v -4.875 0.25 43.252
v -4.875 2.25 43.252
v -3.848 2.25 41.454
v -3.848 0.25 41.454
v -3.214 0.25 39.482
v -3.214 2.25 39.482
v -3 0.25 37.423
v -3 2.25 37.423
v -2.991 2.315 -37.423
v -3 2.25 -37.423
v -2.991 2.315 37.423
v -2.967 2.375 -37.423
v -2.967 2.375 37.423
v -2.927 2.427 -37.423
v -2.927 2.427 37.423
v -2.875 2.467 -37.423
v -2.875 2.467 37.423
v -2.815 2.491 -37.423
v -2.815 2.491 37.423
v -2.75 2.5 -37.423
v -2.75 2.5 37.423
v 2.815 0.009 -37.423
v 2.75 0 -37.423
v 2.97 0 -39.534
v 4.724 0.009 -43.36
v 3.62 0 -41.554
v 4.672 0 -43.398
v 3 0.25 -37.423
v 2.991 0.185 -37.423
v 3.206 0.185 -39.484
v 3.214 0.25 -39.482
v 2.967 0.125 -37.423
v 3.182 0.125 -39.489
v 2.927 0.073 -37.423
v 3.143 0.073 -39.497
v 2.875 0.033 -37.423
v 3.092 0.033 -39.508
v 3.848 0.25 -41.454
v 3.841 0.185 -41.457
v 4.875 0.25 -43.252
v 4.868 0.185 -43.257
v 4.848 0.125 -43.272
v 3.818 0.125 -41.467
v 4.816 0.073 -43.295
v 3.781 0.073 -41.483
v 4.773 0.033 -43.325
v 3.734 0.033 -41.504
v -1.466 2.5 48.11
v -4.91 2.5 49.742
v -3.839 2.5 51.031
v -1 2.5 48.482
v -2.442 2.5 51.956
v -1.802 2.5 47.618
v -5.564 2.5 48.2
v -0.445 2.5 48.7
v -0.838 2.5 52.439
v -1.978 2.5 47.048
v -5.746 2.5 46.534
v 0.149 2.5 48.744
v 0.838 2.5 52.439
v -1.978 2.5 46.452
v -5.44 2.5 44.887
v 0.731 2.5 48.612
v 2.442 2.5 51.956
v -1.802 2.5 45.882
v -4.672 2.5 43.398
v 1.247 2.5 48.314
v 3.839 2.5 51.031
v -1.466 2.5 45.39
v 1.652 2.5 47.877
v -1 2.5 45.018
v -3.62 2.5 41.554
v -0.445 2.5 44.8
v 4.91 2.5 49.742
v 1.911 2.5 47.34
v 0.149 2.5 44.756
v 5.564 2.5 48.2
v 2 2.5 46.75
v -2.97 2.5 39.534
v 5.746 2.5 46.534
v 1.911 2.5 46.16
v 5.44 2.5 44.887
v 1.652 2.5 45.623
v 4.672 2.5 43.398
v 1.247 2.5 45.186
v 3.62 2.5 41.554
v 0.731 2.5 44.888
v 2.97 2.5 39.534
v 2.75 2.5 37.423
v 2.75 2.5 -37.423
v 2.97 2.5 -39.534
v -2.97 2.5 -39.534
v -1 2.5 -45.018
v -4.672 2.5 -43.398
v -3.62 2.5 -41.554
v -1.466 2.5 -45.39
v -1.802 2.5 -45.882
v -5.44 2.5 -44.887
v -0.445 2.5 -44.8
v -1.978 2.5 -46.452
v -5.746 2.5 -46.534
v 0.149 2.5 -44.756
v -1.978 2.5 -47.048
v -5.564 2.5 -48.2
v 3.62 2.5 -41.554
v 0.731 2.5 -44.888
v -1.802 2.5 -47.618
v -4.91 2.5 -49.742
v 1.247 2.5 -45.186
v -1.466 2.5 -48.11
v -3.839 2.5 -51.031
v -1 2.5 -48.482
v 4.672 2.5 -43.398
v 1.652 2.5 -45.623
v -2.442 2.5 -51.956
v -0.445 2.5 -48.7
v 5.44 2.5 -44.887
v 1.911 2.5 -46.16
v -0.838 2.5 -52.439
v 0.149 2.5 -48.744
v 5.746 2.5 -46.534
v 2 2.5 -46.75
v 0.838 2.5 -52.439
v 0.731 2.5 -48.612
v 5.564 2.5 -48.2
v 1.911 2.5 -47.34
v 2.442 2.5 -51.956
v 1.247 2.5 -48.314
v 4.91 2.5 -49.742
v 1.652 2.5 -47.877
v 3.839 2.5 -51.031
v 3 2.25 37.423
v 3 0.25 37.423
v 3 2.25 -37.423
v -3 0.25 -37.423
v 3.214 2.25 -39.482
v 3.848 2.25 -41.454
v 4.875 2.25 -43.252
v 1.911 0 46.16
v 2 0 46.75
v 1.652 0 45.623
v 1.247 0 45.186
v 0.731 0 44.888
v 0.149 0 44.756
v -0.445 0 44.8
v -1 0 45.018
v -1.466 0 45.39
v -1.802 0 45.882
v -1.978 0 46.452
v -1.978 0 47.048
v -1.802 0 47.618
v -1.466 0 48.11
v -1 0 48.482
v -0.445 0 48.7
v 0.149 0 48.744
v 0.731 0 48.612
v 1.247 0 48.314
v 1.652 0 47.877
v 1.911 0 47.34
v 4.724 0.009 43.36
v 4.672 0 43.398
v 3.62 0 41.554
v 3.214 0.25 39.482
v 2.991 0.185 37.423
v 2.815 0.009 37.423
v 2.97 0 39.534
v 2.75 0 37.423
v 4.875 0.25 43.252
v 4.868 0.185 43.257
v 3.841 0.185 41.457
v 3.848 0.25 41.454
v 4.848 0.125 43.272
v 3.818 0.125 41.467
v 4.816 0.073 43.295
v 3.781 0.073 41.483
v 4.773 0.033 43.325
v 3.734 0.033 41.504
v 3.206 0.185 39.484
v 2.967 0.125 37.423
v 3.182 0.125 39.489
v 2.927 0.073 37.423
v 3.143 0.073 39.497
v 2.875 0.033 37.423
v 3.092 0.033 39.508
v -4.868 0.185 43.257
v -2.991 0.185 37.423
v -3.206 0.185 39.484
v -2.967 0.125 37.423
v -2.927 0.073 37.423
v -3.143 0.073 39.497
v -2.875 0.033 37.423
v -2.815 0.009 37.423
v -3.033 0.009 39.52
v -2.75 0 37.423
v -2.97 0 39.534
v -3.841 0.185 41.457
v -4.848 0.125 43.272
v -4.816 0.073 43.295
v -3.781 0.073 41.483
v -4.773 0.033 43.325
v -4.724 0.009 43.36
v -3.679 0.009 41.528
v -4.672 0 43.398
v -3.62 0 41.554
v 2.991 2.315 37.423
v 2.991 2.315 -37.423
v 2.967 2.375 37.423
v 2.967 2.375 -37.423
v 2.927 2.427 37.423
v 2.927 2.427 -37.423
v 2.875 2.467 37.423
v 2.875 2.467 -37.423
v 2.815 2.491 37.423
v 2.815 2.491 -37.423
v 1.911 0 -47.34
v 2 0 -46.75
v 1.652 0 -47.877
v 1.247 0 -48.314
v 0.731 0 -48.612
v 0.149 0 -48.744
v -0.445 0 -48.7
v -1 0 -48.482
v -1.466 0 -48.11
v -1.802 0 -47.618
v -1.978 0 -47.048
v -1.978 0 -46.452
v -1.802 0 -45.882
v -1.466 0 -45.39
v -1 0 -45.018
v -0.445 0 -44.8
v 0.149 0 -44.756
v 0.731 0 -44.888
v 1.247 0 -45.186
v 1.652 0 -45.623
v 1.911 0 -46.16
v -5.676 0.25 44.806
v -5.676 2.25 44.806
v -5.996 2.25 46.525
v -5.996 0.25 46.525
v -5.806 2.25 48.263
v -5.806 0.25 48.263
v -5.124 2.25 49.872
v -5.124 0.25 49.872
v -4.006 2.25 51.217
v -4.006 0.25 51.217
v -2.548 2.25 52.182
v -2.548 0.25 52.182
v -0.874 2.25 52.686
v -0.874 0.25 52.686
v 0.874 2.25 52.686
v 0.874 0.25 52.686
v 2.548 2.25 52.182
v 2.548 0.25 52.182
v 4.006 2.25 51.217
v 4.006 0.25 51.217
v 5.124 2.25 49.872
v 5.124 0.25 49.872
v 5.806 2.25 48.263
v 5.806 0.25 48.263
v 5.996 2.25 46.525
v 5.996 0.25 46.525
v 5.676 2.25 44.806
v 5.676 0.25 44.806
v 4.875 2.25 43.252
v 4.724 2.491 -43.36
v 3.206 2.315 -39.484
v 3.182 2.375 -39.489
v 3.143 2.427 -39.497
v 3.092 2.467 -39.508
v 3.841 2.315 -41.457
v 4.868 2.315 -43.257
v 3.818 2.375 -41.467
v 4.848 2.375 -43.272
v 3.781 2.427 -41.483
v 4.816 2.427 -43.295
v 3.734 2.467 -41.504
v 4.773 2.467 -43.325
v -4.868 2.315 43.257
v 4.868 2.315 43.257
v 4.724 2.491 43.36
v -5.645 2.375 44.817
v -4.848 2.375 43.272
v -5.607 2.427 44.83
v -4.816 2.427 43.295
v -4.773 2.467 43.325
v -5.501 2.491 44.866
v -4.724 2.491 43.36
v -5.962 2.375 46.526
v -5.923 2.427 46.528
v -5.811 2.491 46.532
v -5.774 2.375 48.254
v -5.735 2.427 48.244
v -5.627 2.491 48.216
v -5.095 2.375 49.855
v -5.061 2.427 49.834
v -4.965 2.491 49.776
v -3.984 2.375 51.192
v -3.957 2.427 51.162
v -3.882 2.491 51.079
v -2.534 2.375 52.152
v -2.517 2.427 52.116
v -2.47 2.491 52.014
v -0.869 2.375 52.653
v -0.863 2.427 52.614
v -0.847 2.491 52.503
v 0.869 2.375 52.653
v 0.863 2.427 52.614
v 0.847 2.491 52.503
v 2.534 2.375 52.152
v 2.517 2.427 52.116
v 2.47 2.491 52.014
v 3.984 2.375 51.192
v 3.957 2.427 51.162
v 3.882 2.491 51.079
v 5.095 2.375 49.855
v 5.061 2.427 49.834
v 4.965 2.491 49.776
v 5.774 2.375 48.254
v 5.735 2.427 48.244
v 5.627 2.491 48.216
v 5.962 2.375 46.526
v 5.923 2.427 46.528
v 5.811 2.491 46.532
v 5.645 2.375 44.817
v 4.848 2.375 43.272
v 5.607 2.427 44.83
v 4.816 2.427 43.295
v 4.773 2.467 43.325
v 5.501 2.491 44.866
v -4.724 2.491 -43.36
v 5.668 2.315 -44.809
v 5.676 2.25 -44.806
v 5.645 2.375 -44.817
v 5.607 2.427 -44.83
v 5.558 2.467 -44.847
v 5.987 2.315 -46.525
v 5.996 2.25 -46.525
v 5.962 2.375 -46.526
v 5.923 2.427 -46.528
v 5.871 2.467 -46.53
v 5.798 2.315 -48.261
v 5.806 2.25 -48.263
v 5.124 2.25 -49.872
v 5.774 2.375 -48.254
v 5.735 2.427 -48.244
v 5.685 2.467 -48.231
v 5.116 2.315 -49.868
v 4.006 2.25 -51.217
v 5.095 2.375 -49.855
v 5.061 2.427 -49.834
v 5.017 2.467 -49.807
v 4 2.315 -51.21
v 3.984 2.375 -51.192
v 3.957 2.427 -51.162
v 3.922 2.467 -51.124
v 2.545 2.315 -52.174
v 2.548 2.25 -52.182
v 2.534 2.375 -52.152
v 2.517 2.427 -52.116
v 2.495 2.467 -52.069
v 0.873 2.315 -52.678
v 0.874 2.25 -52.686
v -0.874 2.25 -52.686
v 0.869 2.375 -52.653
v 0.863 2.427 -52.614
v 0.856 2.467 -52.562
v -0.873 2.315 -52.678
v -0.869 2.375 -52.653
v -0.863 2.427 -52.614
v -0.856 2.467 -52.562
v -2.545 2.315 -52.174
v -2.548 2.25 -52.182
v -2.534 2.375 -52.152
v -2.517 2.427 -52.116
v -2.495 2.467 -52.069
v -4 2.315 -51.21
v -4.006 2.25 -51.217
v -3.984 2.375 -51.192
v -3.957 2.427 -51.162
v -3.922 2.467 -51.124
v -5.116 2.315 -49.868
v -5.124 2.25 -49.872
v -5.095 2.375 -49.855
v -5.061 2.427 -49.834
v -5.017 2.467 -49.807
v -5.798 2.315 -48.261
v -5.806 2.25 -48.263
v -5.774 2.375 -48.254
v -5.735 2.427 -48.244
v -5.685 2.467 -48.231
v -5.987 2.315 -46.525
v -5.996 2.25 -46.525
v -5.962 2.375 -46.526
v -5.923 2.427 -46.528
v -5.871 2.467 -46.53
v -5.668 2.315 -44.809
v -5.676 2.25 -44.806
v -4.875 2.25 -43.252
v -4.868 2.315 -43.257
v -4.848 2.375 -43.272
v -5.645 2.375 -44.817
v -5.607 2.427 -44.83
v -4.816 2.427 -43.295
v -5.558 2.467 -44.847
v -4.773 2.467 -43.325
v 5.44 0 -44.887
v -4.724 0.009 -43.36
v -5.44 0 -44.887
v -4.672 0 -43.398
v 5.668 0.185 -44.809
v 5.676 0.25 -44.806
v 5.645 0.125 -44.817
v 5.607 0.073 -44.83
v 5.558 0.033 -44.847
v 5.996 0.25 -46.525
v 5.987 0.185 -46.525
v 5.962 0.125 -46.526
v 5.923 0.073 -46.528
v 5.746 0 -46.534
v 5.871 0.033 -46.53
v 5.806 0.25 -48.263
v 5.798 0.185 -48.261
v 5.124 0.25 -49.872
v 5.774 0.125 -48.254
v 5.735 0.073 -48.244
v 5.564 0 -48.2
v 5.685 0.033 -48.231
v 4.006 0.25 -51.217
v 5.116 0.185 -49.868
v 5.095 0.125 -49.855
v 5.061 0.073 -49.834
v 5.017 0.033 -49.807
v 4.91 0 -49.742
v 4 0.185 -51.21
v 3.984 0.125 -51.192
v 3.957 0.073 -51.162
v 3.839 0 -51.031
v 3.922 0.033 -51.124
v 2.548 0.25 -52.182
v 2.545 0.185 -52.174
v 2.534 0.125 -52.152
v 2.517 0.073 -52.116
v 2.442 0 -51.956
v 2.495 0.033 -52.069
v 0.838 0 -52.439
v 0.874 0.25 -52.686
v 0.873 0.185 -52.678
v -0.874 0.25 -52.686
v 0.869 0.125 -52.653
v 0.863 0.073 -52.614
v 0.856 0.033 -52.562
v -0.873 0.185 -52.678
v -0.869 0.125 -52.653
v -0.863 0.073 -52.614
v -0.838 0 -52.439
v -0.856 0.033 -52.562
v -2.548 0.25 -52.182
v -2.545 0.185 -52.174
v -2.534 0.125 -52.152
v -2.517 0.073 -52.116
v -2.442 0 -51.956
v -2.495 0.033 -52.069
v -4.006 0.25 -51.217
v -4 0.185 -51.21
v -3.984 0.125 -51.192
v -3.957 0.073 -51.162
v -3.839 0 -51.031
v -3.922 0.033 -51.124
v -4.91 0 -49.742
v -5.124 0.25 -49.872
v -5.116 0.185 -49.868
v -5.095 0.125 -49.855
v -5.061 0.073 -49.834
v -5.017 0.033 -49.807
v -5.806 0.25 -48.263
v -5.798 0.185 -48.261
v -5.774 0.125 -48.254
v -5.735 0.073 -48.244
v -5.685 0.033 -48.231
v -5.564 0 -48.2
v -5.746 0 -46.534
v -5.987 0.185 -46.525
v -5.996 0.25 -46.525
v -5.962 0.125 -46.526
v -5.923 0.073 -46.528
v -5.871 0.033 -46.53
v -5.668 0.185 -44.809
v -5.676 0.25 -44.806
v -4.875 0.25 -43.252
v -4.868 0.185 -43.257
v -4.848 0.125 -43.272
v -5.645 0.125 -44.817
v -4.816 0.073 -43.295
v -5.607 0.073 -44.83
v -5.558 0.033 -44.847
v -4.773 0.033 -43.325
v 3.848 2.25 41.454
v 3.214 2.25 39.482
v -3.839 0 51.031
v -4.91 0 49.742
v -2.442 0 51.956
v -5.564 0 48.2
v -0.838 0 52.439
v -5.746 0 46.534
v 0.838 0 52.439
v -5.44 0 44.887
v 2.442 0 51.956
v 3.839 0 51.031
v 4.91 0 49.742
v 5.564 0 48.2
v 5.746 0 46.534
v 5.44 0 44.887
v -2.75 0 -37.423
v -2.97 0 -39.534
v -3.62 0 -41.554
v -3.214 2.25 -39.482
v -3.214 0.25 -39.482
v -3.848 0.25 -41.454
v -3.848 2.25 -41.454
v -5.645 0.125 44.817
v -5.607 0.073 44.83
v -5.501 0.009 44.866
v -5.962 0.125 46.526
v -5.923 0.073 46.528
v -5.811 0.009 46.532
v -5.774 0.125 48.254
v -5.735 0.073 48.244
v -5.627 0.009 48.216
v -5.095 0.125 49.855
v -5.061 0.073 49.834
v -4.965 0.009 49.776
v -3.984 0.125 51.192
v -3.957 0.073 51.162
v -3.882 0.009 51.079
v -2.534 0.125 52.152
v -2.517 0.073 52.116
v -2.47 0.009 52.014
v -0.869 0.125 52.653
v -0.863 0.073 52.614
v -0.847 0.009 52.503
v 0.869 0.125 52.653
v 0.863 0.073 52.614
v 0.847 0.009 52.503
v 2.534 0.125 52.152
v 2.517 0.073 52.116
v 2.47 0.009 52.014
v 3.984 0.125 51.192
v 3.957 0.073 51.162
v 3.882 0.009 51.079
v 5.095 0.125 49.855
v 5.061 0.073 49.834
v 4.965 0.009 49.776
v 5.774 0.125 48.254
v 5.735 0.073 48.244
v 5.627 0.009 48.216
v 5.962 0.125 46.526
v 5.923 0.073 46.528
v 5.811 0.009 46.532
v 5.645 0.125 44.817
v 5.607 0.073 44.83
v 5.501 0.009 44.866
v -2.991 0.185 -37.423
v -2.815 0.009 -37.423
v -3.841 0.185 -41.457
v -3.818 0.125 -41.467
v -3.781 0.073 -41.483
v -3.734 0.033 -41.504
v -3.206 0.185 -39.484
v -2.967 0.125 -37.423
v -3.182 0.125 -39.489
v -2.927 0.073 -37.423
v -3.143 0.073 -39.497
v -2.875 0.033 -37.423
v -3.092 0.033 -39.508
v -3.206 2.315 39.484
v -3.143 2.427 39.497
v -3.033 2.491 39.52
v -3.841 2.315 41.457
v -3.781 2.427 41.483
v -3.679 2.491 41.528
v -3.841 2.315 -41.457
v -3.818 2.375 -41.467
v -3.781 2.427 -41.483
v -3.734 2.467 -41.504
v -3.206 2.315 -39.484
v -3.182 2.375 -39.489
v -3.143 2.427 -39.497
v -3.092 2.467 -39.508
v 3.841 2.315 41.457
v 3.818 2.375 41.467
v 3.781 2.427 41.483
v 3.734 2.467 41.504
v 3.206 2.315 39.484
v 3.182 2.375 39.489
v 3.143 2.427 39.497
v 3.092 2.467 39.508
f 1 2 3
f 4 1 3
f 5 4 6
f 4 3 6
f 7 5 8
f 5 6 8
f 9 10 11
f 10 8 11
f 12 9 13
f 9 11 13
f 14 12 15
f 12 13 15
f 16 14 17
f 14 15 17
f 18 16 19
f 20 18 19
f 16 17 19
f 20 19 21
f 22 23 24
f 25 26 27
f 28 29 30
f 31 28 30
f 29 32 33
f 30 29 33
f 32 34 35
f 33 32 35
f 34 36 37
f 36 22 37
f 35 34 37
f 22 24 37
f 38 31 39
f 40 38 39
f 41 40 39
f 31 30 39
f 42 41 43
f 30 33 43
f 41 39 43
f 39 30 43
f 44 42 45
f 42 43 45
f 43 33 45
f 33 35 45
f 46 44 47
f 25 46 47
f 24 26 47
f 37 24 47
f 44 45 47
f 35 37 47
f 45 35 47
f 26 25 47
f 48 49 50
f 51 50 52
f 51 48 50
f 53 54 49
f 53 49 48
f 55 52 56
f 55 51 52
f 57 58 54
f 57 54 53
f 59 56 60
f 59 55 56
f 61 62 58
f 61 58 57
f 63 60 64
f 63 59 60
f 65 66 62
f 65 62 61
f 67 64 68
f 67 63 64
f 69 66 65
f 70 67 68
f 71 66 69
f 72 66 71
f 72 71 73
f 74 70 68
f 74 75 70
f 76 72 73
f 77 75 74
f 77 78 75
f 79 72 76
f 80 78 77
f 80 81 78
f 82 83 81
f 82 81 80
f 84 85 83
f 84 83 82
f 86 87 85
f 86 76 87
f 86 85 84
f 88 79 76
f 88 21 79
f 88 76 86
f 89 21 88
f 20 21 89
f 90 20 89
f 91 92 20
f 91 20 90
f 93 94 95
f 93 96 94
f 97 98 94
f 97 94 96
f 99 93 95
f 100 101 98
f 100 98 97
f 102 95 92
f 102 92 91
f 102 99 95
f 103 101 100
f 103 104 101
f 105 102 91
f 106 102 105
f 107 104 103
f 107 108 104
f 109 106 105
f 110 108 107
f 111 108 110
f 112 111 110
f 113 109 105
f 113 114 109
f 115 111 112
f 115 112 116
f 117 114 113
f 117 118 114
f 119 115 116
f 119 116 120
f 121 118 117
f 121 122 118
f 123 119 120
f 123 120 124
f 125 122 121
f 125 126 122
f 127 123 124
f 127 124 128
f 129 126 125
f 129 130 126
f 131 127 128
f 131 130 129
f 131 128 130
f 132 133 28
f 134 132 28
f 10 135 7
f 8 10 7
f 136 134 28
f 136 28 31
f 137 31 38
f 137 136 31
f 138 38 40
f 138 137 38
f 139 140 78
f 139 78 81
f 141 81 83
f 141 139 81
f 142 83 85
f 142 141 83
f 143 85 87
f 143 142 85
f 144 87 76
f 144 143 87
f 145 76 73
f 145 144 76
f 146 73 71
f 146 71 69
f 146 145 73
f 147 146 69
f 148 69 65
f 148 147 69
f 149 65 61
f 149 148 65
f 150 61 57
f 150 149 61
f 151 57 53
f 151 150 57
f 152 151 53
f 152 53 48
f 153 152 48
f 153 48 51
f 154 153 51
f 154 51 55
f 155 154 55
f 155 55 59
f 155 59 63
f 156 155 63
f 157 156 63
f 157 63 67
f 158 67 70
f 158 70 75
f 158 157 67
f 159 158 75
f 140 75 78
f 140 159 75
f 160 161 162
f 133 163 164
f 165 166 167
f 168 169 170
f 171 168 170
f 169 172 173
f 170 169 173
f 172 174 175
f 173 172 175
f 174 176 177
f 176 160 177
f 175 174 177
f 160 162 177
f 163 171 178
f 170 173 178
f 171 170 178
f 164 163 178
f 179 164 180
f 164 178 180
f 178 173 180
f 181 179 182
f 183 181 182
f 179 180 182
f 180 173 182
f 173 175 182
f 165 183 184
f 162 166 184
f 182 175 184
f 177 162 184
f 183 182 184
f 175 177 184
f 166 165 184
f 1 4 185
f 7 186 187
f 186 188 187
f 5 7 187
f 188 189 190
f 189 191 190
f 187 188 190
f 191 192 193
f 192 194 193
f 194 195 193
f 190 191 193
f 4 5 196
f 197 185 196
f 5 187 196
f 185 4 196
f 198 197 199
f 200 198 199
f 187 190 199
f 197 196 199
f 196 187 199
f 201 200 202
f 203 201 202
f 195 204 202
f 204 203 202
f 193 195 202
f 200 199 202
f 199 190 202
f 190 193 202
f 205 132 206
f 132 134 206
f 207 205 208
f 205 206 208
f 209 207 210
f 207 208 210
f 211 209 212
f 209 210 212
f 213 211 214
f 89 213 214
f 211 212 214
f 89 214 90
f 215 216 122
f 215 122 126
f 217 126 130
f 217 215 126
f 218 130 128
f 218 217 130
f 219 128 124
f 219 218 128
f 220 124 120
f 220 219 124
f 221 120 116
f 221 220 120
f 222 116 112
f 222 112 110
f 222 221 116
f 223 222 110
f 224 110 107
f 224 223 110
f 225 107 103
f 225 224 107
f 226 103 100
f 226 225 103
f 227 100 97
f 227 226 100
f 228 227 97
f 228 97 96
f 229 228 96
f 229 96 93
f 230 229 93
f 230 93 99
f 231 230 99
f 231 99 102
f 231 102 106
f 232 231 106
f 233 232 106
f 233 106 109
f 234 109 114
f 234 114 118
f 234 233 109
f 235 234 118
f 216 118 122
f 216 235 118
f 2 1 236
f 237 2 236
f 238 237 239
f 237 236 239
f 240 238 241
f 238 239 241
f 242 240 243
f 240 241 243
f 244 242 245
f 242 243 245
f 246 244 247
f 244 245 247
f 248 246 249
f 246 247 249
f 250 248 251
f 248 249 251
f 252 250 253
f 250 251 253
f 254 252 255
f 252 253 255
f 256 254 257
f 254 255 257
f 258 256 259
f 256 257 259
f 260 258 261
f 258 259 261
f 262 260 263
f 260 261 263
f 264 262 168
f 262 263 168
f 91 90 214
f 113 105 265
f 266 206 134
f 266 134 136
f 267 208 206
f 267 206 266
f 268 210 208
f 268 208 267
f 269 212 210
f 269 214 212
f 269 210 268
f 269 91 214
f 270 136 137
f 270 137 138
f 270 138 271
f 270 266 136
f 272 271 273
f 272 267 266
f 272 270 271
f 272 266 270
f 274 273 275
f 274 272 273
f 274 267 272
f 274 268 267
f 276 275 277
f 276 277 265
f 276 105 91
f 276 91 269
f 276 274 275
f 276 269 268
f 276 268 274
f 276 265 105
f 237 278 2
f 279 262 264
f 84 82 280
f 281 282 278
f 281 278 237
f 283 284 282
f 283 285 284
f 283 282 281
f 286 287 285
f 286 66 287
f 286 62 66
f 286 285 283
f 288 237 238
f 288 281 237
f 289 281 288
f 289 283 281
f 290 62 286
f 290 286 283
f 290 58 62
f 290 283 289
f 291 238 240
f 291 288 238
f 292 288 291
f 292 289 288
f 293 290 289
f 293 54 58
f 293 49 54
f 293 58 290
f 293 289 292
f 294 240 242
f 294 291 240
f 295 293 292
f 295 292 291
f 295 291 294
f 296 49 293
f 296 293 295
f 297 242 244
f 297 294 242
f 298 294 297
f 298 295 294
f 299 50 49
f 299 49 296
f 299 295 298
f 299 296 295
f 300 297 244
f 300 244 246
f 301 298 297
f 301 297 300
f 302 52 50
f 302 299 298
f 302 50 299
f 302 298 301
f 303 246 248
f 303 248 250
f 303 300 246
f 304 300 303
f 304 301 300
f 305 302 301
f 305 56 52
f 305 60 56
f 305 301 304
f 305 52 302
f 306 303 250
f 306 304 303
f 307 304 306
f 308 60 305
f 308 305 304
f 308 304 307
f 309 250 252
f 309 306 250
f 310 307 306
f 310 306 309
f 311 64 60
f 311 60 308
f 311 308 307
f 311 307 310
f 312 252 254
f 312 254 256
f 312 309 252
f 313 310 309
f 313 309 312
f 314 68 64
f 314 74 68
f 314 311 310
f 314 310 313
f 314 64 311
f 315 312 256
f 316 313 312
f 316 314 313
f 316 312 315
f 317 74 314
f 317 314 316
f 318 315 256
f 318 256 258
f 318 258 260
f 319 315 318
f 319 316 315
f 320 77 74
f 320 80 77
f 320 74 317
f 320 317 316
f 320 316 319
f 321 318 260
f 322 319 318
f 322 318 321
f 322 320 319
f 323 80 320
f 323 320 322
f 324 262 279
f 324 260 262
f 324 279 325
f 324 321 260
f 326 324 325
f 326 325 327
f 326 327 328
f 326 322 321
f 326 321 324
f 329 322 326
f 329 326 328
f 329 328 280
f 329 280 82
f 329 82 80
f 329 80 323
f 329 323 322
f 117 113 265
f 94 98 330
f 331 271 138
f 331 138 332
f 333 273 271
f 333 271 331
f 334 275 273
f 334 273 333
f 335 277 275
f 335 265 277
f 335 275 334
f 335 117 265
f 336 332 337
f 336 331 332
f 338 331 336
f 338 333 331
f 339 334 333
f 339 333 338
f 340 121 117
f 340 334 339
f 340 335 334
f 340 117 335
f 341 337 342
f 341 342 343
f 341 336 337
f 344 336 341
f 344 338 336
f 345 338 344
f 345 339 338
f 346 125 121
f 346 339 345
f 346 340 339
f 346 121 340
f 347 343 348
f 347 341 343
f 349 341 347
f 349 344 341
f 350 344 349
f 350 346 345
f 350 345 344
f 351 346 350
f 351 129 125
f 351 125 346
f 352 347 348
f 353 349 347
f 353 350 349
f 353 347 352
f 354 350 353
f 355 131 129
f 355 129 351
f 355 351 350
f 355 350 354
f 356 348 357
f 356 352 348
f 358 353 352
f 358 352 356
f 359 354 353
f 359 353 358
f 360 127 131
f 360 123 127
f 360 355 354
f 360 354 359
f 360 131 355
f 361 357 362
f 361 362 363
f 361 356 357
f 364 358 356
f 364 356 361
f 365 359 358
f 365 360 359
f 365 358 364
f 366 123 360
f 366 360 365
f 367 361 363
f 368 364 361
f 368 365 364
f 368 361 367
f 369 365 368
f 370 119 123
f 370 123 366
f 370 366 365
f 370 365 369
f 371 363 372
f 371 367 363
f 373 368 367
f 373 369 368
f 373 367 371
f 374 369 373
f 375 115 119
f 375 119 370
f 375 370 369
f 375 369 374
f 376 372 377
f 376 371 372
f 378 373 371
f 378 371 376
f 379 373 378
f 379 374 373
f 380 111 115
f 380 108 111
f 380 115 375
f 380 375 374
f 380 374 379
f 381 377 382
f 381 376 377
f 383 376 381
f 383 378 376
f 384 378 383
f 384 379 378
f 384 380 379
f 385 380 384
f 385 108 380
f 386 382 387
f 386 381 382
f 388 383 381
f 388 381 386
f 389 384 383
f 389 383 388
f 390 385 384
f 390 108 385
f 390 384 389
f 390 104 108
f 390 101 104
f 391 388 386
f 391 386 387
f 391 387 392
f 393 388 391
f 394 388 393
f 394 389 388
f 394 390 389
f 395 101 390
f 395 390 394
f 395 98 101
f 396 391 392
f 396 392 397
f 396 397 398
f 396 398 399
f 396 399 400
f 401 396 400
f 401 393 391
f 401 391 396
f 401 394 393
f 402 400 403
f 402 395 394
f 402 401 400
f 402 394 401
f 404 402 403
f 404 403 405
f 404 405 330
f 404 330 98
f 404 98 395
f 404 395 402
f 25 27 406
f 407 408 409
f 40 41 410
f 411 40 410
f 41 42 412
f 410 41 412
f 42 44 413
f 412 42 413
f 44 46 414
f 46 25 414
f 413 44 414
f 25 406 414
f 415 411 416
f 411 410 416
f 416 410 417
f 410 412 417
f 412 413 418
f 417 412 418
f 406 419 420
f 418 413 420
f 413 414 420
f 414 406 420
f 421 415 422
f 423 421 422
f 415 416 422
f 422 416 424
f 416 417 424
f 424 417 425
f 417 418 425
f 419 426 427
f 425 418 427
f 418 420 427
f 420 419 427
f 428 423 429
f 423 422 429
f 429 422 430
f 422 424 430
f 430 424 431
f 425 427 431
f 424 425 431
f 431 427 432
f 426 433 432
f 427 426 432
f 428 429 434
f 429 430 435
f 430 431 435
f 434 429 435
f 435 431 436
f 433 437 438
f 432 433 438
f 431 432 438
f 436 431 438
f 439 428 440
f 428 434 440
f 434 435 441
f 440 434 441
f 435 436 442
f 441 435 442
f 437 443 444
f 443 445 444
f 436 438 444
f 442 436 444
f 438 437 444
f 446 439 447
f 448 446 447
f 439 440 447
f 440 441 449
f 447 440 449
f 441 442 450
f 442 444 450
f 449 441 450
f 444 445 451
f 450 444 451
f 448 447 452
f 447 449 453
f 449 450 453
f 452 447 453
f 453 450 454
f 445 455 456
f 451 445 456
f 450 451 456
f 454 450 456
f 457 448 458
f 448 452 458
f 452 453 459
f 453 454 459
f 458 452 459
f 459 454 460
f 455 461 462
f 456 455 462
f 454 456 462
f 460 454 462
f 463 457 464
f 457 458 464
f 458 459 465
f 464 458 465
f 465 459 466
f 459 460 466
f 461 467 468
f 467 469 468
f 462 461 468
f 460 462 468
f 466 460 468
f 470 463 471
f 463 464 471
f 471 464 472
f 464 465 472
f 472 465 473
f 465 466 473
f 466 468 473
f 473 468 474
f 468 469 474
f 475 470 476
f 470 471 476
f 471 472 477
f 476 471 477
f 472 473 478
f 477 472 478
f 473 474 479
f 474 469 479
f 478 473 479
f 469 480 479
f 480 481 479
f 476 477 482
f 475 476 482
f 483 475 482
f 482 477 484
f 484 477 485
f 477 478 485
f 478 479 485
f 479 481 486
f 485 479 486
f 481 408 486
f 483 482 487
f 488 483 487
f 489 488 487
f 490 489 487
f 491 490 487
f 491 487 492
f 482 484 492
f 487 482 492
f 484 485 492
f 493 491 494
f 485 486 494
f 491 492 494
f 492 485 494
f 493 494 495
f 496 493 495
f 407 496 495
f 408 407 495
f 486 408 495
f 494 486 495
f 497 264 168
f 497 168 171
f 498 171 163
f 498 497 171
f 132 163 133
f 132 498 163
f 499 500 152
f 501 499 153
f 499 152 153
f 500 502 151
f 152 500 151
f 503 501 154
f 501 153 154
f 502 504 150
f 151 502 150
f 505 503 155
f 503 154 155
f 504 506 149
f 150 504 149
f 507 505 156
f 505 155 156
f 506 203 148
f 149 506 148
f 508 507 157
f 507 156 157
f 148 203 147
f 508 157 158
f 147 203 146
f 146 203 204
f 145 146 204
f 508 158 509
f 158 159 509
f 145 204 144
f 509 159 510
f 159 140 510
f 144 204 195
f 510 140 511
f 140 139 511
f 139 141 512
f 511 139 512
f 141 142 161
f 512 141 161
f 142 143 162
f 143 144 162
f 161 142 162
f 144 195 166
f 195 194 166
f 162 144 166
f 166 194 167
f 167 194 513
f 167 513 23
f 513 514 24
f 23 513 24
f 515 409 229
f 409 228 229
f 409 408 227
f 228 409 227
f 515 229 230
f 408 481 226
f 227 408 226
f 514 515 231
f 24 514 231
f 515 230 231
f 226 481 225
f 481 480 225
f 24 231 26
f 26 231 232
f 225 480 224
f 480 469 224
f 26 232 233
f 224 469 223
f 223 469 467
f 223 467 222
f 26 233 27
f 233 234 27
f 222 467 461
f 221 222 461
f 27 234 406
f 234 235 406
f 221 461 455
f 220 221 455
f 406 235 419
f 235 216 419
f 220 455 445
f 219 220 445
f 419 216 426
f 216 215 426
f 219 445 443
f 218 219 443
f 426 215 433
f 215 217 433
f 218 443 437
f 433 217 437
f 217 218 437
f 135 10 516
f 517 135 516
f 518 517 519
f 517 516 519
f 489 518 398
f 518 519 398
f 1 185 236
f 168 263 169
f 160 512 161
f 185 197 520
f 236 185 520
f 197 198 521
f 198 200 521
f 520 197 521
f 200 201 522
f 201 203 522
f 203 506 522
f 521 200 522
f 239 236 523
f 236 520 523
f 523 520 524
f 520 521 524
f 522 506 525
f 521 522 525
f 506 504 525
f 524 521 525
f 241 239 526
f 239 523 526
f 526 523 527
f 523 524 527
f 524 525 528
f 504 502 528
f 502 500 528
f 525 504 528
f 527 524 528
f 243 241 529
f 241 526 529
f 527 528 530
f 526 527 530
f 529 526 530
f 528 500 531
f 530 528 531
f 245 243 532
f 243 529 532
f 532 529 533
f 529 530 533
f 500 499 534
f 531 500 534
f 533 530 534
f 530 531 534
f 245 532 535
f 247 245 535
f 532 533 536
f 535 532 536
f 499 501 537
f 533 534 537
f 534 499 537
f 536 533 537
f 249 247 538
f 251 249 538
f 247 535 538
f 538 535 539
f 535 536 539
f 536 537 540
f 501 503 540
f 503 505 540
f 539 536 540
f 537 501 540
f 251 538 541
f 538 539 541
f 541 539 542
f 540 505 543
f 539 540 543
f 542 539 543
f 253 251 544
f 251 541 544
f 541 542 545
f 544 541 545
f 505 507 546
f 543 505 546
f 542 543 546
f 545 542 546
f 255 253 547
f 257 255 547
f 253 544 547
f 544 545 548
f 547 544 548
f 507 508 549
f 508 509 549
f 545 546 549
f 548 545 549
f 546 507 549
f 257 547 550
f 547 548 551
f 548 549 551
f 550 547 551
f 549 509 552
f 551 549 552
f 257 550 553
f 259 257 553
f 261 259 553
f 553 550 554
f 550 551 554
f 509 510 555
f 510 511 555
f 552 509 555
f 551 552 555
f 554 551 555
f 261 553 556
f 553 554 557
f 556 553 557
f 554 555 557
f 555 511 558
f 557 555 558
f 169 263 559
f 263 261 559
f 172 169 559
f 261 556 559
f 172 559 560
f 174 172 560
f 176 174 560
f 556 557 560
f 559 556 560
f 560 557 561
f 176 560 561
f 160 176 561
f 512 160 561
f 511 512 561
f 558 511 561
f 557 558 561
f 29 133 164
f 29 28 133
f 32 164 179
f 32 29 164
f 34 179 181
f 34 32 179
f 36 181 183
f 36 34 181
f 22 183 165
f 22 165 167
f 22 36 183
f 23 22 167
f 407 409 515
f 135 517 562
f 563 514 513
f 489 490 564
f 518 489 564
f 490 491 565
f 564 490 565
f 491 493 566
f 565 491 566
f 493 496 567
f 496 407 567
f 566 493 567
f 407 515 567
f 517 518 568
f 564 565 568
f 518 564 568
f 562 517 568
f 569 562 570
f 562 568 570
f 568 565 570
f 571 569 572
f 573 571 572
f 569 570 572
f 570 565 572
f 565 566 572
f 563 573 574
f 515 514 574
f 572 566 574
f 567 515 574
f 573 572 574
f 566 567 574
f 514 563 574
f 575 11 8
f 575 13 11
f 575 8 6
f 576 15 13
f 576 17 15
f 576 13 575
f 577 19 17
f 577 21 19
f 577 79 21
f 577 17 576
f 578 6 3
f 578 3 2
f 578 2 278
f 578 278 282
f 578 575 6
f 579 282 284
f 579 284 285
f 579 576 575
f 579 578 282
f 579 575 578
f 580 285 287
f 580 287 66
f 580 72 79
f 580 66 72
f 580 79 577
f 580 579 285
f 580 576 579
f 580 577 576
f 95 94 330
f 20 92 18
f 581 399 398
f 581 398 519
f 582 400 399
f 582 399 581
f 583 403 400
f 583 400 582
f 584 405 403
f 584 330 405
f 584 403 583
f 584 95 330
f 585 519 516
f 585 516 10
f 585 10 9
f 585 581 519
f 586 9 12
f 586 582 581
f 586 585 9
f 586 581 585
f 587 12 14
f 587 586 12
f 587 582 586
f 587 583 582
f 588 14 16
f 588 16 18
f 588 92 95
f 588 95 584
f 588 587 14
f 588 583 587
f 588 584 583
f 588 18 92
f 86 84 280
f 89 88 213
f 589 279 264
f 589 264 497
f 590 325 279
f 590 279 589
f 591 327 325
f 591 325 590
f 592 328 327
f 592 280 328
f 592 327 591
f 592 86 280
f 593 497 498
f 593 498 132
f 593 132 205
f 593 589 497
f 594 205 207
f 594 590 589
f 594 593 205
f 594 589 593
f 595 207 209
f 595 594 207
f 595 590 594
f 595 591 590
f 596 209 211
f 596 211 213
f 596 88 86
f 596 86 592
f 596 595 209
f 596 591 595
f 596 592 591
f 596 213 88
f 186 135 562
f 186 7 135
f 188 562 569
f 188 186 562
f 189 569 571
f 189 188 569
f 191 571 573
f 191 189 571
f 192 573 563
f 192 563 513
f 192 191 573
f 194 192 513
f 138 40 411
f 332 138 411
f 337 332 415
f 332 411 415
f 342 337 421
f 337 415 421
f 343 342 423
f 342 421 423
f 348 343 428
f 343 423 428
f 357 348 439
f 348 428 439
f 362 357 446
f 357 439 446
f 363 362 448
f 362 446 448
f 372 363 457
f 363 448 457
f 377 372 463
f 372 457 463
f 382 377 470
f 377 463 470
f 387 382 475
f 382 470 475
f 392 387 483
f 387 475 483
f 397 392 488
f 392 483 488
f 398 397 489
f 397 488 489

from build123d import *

# Parameters (mm, degrees)
SKETCH1_R           = 2
BOSS_EXTRUDE1_DEPTH = 2.5
FILLET1_R           = 10
FILLET2_R           = 0.25


with BuildPart() as part:
    # Sketch1 → Boss-Extrude1 (new body)
    with BuildSketch(Plane(origin=(0, 0, 0), x_dir=(1, 0, 0), z_dir=(0, 1, 0))):
        with BuildLine():
            ThreePointArc((-3, -41.553847577), (0, -52.75), (3, -41.553847577))
            Line((3, -41.553847577), (3, 41.553847577))
            ThreePointArc((3, 41.553847577), (0, 52.75), (-3, 41.553847577))
            Line((-3, 41.553847577), (-3, -41.553847577))
        make_face()
        with Locations((0, -46.75)):
            Circle(SKETCH1_R, mode=Mode.SUBTRACT)
        with Locations((0, 46.75)):
            Circle(SKETCH1_R, mode=Mode.SUBTRACT)
    extrude(amount=BOSS_EXTRUDE1_DEPTH)

    # Fillet1
    fillet1_edges = [part.edges().sort_by_distance(p)[0] for p in [
        (-3, 1.25, 41.553847577),
        (-3, 1.25, -41.553847577),
        (3, 1.25, -41.553847577),
        (3, 1.25, 41.553847577),
    ]]
    fillet(fillet1_edges, radius=FILLET1_R)

    # Fillet2
    fillet2_edges = [part.edges().sort_by_distance(p)[0] for p in [
        (0, 0, 52.75),
        (0, 2.5, 52.75),
        (-3, 0, 0),
        (-3, 2.5, 0),
        (0, 0, -52.75),
        (0, 2.5, -52.75),
        (3, 0, 0),
        (3, 2.5, 0),
        (-3.480283618, 0, 40.484483125),
        (-3.480283618, 2.5, 40.484483125),
        (-3.480283618, 0, -40.484483125),
        (-3.480283618, 2.5, -40.484483125),
        (3.480283618, 0, -40.484483125),
        (3.480283618, 2.5, -40.484483125),
        (3.480283618, 0, 40.484483125),
        (3.480283618, 2.5, 40.484483125),
    ]]
    fillet(fillet2_edges, radius=FILLET2_R)


solid = part.part
